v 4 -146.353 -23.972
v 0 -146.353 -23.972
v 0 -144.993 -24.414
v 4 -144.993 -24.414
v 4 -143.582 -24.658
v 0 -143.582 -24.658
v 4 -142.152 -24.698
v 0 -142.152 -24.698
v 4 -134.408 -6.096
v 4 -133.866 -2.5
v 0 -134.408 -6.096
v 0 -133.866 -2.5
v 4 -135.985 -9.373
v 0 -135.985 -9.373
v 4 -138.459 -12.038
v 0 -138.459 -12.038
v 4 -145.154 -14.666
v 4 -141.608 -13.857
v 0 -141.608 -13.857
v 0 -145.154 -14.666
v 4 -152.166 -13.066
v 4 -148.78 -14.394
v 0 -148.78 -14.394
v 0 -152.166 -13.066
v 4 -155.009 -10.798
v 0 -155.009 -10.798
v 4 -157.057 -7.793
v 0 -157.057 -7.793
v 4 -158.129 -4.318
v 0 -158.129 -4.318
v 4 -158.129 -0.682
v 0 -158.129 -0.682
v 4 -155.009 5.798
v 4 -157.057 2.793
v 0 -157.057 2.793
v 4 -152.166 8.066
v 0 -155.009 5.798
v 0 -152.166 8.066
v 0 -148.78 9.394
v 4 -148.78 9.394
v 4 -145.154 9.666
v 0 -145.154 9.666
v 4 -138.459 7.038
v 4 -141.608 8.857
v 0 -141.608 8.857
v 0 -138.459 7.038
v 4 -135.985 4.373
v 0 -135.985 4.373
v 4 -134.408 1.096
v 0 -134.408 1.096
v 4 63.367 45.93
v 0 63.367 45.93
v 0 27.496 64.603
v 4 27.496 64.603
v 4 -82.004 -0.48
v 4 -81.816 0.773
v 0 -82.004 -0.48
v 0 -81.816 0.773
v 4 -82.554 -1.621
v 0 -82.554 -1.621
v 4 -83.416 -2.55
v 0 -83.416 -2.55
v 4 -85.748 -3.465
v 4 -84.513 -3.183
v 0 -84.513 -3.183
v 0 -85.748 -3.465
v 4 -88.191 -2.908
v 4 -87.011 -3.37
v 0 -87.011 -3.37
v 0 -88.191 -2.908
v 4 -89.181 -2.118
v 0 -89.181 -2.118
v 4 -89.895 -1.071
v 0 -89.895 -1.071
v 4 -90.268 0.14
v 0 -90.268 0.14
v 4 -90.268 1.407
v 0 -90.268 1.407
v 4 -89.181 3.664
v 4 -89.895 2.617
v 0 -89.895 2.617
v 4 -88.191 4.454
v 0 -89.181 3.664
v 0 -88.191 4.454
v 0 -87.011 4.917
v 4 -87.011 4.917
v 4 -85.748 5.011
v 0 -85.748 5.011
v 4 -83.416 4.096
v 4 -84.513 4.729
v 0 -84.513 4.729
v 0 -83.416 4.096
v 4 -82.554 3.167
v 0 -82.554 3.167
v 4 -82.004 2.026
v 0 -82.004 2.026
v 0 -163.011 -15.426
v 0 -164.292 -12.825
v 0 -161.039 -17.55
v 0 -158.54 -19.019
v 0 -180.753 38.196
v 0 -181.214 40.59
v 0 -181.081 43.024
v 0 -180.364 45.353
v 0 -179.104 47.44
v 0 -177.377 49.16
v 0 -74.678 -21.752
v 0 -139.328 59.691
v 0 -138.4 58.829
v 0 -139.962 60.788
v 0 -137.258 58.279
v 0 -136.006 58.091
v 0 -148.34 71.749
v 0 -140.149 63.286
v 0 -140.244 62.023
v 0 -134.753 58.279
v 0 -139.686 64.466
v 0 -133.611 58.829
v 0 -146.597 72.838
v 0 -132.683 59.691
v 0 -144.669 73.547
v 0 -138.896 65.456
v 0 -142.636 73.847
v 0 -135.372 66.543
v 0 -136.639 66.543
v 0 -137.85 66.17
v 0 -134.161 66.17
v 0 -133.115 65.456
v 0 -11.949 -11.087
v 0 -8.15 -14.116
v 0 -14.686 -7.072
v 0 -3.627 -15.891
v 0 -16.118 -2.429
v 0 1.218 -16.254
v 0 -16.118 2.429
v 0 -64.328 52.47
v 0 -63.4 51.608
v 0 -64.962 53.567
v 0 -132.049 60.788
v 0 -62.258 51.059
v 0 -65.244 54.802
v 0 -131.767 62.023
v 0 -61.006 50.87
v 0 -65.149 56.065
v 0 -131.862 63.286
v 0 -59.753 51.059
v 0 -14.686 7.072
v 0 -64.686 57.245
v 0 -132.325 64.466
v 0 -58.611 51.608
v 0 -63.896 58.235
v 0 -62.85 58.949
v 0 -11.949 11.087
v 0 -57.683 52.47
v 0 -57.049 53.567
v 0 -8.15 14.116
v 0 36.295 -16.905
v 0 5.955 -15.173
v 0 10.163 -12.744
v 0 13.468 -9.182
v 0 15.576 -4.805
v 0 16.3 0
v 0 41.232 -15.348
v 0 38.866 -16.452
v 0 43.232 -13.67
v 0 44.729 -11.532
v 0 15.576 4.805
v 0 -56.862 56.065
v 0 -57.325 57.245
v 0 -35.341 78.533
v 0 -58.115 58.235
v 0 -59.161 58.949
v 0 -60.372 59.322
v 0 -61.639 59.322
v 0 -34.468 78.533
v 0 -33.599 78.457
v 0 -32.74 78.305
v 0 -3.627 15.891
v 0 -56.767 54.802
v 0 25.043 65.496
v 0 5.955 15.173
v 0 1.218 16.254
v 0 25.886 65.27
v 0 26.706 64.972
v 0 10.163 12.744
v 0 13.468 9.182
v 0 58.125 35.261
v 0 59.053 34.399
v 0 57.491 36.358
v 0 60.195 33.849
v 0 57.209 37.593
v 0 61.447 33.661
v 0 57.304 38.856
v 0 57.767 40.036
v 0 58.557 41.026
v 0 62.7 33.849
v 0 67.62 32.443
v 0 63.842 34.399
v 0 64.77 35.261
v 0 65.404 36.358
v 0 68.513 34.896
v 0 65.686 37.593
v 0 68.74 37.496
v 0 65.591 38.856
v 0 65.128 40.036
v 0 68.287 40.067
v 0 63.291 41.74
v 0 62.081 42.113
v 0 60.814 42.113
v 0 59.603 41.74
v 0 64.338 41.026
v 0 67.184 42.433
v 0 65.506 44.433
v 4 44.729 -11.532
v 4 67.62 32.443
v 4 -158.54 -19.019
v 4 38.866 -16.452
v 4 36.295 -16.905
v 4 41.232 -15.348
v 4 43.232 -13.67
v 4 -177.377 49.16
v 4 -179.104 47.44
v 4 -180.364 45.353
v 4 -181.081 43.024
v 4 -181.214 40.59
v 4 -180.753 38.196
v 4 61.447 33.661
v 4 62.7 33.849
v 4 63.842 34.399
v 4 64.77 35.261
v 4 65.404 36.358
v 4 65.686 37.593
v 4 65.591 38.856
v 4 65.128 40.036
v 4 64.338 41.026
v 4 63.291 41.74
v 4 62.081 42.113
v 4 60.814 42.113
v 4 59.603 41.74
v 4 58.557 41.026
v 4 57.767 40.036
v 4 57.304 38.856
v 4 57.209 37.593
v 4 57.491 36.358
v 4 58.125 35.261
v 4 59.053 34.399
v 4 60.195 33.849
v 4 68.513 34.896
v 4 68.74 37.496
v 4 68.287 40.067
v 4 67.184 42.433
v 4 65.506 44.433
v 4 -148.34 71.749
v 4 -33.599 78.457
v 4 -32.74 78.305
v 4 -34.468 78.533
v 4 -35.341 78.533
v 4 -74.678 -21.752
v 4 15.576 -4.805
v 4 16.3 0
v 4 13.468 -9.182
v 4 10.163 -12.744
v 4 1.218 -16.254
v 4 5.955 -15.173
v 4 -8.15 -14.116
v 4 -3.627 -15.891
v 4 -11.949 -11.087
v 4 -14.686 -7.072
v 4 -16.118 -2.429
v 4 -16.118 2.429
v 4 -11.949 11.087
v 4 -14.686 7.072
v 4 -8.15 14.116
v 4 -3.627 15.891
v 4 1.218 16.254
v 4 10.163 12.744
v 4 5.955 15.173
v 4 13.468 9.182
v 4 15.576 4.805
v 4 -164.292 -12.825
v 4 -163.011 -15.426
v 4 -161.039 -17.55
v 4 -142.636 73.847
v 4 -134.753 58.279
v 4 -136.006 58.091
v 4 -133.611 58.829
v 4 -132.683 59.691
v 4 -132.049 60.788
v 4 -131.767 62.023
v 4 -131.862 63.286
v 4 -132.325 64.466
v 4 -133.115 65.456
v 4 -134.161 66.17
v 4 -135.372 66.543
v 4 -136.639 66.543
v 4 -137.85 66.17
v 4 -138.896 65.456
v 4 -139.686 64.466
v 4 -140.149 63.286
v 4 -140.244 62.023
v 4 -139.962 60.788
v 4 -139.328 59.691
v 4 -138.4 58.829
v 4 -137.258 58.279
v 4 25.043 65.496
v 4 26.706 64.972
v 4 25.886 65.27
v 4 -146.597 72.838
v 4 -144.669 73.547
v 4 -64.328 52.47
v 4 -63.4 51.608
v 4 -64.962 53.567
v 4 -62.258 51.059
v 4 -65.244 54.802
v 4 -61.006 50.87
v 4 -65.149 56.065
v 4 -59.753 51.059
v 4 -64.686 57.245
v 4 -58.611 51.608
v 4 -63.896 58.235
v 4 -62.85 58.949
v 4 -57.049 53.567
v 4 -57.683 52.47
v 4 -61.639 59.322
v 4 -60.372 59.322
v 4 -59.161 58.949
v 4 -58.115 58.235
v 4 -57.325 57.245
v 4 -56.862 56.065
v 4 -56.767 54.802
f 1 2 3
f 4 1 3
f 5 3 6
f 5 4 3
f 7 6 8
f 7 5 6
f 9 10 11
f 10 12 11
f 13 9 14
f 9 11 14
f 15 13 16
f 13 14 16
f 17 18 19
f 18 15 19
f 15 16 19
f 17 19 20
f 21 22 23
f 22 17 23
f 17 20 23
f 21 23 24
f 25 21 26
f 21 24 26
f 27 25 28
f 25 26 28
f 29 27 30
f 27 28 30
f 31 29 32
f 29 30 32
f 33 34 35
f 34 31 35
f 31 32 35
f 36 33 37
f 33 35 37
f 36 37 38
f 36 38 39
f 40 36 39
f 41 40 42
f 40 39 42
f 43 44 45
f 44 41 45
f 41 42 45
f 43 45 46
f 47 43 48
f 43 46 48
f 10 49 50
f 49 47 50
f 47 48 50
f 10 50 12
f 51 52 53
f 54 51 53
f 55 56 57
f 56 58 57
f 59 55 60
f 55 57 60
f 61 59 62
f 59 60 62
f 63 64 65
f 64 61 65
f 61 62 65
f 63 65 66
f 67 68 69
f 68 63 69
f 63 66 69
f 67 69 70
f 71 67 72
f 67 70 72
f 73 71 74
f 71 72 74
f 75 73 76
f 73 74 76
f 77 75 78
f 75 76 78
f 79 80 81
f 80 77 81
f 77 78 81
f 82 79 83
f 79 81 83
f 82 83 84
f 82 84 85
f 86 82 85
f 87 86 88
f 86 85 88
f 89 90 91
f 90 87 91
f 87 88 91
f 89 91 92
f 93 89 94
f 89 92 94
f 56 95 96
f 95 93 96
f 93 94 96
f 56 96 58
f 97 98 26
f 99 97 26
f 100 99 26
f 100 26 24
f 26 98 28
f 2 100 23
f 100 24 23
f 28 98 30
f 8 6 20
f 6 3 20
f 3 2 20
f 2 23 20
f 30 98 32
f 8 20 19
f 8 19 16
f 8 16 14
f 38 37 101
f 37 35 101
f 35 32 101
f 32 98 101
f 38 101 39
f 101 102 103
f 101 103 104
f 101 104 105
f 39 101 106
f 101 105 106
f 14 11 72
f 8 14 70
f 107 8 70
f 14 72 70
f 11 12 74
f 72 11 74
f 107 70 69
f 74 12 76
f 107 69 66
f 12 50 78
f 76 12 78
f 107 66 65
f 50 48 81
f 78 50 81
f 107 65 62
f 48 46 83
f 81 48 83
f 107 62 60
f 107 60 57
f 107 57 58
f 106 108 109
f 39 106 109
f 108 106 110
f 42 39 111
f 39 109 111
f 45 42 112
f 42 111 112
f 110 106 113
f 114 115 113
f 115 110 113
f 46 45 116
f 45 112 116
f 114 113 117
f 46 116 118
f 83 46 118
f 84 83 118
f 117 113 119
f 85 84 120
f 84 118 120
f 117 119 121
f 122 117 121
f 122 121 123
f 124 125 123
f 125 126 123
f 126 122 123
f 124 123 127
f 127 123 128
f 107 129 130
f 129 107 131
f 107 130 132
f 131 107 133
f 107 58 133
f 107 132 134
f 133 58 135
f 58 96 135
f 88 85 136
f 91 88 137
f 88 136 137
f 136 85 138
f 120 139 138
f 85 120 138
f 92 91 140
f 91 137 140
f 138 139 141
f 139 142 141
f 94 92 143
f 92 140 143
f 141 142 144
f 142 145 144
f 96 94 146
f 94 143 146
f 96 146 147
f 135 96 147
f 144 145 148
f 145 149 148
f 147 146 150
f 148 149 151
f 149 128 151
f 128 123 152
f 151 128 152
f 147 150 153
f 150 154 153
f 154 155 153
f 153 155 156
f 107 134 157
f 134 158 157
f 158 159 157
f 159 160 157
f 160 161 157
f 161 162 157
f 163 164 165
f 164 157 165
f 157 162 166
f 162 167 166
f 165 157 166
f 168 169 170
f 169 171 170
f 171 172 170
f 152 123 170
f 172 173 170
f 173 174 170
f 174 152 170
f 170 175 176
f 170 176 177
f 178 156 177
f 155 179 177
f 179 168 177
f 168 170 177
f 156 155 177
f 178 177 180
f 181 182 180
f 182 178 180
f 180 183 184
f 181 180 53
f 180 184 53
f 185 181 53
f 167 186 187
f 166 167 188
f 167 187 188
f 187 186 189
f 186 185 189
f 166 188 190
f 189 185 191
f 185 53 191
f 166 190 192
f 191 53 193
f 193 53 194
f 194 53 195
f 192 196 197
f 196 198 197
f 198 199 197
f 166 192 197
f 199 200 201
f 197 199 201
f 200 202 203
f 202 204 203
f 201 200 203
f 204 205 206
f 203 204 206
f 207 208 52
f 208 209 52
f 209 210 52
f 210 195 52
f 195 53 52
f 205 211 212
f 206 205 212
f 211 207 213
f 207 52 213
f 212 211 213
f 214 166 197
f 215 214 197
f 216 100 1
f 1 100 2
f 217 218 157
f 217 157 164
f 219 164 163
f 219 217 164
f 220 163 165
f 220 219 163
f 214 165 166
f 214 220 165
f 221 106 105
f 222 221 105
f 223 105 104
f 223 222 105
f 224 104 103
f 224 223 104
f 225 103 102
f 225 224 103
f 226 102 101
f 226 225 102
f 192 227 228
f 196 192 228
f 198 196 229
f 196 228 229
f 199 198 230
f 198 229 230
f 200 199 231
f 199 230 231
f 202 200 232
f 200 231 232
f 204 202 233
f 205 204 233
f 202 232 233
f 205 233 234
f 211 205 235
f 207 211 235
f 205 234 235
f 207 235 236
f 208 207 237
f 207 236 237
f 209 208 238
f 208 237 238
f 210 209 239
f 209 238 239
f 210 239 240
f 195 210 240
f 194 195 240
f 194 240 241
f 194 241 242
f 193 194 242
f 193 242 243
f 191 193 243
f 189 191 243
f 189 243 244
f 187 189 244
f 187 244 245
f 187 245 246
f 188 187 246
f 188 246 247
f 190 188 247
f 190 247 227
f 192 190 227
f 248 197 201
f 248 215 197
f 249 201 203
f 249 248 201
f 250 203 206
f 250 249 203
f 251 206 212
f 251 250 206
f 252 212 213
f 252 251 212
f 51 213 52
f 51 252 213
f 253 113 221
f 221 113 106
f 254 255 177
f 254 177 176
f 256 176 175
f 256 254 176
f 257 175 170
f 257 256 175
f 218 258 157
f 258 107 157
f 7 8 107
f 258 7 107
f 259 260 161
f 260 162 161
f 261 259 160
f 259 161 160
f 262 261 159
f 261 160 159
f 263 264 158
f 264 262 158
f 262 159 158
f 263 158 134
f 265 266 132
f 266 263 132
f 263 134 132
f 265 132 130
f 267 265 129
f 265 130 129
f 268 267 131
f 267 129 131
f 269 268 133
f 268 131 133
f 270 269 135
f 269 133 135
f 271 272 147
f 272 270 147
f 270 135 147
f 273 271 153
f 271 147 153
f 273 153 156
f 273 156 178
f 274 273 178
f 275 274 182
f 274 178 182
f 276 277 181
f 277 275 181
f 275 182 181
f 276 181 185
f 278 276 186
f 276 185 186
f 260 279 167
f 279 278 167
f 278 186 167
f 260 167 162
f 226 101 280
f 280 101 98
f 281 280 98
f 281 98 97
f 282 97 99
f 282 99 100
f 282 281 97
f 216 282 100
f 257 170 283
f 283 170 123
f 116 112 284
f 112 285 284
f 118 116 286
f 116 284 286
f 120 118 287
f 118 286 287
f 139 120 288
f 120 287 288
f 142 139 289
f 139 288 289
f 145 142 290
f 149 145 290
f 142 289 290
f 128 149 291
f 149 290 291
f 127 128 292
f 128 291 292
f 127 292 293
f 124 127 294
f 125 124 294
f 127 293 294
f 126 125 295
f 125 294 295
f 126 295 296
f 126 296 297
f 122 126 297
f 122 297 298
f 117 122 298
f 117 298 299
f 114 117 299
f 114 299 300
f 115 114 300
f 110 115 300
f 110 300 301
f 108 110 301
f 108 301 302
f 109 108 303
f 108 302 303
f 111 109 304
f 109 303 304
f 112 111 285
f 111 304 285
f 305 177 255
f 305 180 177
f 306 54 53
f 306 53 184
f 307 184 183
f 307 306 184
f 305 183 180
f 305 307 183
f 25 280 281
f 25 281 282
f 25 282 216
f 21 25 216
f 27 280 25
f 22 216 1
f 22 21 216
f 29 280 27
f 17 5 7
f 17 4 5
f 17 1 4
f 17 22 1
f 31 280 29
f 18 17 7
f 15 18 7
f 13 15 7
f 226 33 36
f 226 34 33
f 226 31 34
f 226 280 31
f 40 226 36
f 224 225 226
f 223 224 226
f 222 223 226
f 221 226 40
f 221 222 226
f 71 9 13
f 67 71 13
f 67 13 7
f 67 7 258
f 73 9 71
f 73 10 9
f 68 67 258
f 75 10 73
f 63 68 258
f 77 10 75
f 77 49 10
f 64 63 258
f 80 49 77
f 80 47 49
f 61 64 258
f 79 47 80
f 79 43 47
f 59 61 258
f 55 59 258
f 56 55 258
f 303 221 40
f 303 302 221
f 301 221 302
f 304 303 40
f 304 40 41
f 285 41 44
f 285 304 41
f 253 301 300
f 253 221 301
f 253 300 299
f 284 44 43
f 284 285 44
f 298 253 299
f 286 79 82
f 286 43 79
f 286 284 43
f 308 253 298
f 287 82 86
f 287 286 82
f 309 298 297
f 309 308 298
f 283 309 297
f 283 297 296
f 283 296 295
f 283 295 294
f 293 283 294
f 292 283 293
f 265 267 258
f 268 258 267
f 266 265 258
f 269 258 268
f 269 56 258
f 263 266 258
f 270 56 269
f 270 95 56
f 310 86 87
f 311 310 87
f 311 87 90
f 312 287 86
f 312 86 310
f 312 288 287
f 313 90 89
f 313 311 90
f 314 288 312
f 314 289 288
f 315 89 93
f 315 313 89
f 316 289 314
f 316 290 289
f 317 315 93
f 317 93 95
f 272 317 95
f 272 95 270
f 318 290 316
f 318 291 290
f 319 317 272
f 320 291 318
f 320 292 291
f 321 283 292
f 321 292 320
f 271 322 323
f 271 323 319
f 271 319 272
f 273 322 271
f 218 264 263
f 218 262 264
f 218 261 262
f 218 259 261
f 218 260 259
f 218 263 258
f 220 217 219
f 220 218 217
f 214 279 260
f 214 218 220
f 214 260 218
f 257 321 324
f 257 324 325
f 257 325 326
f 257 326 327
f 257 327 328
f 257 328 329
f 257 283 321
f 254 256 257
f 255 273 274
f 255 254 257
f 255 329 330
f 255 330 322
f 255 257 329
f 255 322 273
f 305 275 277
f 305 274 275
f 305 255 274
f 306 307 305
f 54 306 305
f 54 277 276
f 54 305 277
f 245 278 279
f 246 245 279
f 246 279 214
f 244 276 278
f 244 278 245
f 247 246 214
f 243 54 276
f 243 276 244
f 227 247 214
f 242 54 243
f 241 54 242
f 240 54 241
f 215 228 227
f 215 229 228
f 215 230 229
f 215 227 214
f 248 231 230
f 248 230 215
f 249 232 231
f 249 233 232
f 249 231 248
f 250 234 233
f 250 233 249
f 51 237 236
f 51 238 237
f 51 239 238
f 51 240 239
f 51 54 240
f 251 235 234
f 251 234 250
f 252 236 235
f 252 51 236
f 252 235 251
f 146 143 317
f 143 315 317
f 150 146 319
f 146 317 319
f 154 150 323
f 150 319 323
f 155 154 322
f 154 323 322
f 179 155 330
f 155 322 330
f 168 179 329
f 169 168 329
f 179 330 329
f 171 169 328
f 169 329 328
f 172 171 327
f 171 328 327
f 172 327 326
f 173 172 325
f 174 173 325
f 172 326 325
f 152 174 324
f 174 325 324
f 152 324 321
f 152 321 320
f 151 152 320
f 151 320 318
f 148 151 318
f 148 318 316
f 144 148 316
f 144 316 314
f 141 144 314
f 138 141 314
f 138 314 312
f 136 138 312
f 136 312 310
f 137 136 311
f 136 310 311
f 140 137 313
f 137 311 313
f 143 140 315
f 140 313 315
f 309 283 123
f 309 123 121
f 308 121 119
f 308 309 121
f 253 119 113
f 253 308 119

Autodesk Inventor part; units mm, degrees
ref_plane "YZ Plane" through (0, 0, 0) normal (1, 0, 0) x (0, 1, 0)
ref_plane "XZ Plane" through (0, 0, 0) normal (0, 1, 0) x (-1, 0, 0)
ref_plane "XY Plane" through (0, 0, 0) normal (0, 0, 1) x (1, 0, 0)
sketch "Sketch1" plane through (0, 0, 0) normal (1, 0, 0) x (0, 1, 0)
  circle A0 centre (0, 0) radius 62.5 construction
  circle A1 centre (-146.0656, -2.5) radius 50 construction
  line L0 (-146.0656, -2.5) -> (0, 0) construction
  line L1 (-172.7208, -52.5) -> (-113.4241, -52.5) construction
  line L2 (-16.0459, -62.5) -> (40.9165, -62.5) construction
  line L3 (-162.86, -17.263) -> (-144.3319, -24.7934)
  line L4 (-144.3319, -24.7934) -> (-74.6779, -21.7515)
  line L5 (42.063, -16.6532) -> (72.2375, 41.3128)
  line L6 (72.2375, 41.3128) -> (-2.0558, 79.9865)
  line L7 (-2.0558, 79.9865) -> (-145.8225, 73.708)
  line L8 (-145.8225, 73.708) -> (-182.9035, 44.86)
  line L9 (-182.9035, 44.86) -> (-162.86, -17.263)
  circle A2 centre (0, 0) radius 16.3
  circle A3 centre (-146.0656, -2.5) radius 12.2
  line L10 (-153.5959, -21.0282) -> (-146.0656, -2.5) construction
  arc A4 (-63.375, -21.2579) -> (-74.6779, -21.7515) centre (-69.3319, -14.5113) ccw construction
  line L11 (-99.9551, -22.8554) -> (-99.3168, -22.8275) construction
  line L12 (-99.3168, -22.8275) -> (-63.375, -21.2579) construction
  line L13 (-63.375, -21.2579) -> (-99.9551, -22.8554) construction
  line L14 (-74.6779, -21.7515) -> (42.063, -16.6532)
  line L15 (0, 0) -> (-212.6616, 0) construction
  circle A5 centre (-86.0656, 0.7731) radius 4.25
  dimension "d0" = 125
  dimension "d1" = 100
  dimension "d2" = 146.087
  dimension "d3" = 10
  dimension "d4" = 20
  dimension "d5" = 32.6
  dimension "d6" = 24.4
  dimension "d7" = 23.099
  dimension "d8" = 20
  dimension "d9" = 130
  dimension "d10" = 110
  dimension "d12" = 155.381
  dimension "d13" = 80
  dimension "d14" = 90
  dimension "d15" = 150
  dimension "Height" = 70
  dimension "d17" = 45
  dimension "d18" = 60
  dimension "d30" = 8.5
  dimension "d31" = 23
  dimension "d32" = 60
extrude "Extrusion1" add sketch "Sketch1" along normal blind 4
fillet "Fillet3" radius 10 6 edges at (2, 72.2375, 41.3128) (2, 42.063, -16.6532) (2, -144.3319, -24.7934) (2, -162.86, -17.263) (2, -182.9035, 44.86) (2, -145.8225, 73.708)
chamfer "Chamfer1" distance 32 angle 45 1 edges at (2, -2.0558, 79.9865)
fillet "Fillet4" radius 10 2 edges at (2, 26.3287, 65.2108) (2, -34.0253, 78.5903)
sketch "Sketch2" plane through (4, 0, 0) normal (1, 0, 0) x (0, 0, -1)
  circle A0 centre (0, 0) radius 16.3
  circle A1 centre (0, 0) radius 16.3 projected
  circle A2 centre (-62.3406, -136.0055) radius 4.25
  line L0 (-71.7494, -148.34) -> (-49.1595, -177.377) projected
  line L1 (-38.1961, -180.7535) -> (12.8252, -164.2919) projected
  circle A3 centre (-37.9106, 61.4474) radius 4.25
  arc A4 (-32.4427, 67.6201) -> (-45.9302, 63.3673) centre (-37.0601, 58.7499) ccw projected
  line L2 (11.532, 44.7289) -> (-32.4427, 67.6201) projected
  line L3 (-45.9302, 63.3673) -> (-64.6029, 27.4965) projected
  circle A5 centre (-55.1197, -61.0055) radius 4.25
  line L4 (-55.1197, -61.0055) -> (-62.3406, -136.0055)
  line L5 (-78.5329, -35.3406) -> (-73.8471, -142.6359) projected
  point P0 (18.0192, 10.7846)
  point P1 (18.8908, -9.1727)
  dimension "d39" = 32.6
  dimension "d42" = 8.5
  dimension "d43" = 15
  dimension "d44" = 50
  dimension "d45" = 8.5
  dimension "d47" = 8
  dimension "d48" = 8
  dimension "d49" = 8.5
  dimension "d50" = 8
  dimension "d51" = 75
extrude "Extrusion2" cut sketch "Sketch2" against normal blind 9.5
properties part number "Module Plate 1" material "Aluminum 6061"
